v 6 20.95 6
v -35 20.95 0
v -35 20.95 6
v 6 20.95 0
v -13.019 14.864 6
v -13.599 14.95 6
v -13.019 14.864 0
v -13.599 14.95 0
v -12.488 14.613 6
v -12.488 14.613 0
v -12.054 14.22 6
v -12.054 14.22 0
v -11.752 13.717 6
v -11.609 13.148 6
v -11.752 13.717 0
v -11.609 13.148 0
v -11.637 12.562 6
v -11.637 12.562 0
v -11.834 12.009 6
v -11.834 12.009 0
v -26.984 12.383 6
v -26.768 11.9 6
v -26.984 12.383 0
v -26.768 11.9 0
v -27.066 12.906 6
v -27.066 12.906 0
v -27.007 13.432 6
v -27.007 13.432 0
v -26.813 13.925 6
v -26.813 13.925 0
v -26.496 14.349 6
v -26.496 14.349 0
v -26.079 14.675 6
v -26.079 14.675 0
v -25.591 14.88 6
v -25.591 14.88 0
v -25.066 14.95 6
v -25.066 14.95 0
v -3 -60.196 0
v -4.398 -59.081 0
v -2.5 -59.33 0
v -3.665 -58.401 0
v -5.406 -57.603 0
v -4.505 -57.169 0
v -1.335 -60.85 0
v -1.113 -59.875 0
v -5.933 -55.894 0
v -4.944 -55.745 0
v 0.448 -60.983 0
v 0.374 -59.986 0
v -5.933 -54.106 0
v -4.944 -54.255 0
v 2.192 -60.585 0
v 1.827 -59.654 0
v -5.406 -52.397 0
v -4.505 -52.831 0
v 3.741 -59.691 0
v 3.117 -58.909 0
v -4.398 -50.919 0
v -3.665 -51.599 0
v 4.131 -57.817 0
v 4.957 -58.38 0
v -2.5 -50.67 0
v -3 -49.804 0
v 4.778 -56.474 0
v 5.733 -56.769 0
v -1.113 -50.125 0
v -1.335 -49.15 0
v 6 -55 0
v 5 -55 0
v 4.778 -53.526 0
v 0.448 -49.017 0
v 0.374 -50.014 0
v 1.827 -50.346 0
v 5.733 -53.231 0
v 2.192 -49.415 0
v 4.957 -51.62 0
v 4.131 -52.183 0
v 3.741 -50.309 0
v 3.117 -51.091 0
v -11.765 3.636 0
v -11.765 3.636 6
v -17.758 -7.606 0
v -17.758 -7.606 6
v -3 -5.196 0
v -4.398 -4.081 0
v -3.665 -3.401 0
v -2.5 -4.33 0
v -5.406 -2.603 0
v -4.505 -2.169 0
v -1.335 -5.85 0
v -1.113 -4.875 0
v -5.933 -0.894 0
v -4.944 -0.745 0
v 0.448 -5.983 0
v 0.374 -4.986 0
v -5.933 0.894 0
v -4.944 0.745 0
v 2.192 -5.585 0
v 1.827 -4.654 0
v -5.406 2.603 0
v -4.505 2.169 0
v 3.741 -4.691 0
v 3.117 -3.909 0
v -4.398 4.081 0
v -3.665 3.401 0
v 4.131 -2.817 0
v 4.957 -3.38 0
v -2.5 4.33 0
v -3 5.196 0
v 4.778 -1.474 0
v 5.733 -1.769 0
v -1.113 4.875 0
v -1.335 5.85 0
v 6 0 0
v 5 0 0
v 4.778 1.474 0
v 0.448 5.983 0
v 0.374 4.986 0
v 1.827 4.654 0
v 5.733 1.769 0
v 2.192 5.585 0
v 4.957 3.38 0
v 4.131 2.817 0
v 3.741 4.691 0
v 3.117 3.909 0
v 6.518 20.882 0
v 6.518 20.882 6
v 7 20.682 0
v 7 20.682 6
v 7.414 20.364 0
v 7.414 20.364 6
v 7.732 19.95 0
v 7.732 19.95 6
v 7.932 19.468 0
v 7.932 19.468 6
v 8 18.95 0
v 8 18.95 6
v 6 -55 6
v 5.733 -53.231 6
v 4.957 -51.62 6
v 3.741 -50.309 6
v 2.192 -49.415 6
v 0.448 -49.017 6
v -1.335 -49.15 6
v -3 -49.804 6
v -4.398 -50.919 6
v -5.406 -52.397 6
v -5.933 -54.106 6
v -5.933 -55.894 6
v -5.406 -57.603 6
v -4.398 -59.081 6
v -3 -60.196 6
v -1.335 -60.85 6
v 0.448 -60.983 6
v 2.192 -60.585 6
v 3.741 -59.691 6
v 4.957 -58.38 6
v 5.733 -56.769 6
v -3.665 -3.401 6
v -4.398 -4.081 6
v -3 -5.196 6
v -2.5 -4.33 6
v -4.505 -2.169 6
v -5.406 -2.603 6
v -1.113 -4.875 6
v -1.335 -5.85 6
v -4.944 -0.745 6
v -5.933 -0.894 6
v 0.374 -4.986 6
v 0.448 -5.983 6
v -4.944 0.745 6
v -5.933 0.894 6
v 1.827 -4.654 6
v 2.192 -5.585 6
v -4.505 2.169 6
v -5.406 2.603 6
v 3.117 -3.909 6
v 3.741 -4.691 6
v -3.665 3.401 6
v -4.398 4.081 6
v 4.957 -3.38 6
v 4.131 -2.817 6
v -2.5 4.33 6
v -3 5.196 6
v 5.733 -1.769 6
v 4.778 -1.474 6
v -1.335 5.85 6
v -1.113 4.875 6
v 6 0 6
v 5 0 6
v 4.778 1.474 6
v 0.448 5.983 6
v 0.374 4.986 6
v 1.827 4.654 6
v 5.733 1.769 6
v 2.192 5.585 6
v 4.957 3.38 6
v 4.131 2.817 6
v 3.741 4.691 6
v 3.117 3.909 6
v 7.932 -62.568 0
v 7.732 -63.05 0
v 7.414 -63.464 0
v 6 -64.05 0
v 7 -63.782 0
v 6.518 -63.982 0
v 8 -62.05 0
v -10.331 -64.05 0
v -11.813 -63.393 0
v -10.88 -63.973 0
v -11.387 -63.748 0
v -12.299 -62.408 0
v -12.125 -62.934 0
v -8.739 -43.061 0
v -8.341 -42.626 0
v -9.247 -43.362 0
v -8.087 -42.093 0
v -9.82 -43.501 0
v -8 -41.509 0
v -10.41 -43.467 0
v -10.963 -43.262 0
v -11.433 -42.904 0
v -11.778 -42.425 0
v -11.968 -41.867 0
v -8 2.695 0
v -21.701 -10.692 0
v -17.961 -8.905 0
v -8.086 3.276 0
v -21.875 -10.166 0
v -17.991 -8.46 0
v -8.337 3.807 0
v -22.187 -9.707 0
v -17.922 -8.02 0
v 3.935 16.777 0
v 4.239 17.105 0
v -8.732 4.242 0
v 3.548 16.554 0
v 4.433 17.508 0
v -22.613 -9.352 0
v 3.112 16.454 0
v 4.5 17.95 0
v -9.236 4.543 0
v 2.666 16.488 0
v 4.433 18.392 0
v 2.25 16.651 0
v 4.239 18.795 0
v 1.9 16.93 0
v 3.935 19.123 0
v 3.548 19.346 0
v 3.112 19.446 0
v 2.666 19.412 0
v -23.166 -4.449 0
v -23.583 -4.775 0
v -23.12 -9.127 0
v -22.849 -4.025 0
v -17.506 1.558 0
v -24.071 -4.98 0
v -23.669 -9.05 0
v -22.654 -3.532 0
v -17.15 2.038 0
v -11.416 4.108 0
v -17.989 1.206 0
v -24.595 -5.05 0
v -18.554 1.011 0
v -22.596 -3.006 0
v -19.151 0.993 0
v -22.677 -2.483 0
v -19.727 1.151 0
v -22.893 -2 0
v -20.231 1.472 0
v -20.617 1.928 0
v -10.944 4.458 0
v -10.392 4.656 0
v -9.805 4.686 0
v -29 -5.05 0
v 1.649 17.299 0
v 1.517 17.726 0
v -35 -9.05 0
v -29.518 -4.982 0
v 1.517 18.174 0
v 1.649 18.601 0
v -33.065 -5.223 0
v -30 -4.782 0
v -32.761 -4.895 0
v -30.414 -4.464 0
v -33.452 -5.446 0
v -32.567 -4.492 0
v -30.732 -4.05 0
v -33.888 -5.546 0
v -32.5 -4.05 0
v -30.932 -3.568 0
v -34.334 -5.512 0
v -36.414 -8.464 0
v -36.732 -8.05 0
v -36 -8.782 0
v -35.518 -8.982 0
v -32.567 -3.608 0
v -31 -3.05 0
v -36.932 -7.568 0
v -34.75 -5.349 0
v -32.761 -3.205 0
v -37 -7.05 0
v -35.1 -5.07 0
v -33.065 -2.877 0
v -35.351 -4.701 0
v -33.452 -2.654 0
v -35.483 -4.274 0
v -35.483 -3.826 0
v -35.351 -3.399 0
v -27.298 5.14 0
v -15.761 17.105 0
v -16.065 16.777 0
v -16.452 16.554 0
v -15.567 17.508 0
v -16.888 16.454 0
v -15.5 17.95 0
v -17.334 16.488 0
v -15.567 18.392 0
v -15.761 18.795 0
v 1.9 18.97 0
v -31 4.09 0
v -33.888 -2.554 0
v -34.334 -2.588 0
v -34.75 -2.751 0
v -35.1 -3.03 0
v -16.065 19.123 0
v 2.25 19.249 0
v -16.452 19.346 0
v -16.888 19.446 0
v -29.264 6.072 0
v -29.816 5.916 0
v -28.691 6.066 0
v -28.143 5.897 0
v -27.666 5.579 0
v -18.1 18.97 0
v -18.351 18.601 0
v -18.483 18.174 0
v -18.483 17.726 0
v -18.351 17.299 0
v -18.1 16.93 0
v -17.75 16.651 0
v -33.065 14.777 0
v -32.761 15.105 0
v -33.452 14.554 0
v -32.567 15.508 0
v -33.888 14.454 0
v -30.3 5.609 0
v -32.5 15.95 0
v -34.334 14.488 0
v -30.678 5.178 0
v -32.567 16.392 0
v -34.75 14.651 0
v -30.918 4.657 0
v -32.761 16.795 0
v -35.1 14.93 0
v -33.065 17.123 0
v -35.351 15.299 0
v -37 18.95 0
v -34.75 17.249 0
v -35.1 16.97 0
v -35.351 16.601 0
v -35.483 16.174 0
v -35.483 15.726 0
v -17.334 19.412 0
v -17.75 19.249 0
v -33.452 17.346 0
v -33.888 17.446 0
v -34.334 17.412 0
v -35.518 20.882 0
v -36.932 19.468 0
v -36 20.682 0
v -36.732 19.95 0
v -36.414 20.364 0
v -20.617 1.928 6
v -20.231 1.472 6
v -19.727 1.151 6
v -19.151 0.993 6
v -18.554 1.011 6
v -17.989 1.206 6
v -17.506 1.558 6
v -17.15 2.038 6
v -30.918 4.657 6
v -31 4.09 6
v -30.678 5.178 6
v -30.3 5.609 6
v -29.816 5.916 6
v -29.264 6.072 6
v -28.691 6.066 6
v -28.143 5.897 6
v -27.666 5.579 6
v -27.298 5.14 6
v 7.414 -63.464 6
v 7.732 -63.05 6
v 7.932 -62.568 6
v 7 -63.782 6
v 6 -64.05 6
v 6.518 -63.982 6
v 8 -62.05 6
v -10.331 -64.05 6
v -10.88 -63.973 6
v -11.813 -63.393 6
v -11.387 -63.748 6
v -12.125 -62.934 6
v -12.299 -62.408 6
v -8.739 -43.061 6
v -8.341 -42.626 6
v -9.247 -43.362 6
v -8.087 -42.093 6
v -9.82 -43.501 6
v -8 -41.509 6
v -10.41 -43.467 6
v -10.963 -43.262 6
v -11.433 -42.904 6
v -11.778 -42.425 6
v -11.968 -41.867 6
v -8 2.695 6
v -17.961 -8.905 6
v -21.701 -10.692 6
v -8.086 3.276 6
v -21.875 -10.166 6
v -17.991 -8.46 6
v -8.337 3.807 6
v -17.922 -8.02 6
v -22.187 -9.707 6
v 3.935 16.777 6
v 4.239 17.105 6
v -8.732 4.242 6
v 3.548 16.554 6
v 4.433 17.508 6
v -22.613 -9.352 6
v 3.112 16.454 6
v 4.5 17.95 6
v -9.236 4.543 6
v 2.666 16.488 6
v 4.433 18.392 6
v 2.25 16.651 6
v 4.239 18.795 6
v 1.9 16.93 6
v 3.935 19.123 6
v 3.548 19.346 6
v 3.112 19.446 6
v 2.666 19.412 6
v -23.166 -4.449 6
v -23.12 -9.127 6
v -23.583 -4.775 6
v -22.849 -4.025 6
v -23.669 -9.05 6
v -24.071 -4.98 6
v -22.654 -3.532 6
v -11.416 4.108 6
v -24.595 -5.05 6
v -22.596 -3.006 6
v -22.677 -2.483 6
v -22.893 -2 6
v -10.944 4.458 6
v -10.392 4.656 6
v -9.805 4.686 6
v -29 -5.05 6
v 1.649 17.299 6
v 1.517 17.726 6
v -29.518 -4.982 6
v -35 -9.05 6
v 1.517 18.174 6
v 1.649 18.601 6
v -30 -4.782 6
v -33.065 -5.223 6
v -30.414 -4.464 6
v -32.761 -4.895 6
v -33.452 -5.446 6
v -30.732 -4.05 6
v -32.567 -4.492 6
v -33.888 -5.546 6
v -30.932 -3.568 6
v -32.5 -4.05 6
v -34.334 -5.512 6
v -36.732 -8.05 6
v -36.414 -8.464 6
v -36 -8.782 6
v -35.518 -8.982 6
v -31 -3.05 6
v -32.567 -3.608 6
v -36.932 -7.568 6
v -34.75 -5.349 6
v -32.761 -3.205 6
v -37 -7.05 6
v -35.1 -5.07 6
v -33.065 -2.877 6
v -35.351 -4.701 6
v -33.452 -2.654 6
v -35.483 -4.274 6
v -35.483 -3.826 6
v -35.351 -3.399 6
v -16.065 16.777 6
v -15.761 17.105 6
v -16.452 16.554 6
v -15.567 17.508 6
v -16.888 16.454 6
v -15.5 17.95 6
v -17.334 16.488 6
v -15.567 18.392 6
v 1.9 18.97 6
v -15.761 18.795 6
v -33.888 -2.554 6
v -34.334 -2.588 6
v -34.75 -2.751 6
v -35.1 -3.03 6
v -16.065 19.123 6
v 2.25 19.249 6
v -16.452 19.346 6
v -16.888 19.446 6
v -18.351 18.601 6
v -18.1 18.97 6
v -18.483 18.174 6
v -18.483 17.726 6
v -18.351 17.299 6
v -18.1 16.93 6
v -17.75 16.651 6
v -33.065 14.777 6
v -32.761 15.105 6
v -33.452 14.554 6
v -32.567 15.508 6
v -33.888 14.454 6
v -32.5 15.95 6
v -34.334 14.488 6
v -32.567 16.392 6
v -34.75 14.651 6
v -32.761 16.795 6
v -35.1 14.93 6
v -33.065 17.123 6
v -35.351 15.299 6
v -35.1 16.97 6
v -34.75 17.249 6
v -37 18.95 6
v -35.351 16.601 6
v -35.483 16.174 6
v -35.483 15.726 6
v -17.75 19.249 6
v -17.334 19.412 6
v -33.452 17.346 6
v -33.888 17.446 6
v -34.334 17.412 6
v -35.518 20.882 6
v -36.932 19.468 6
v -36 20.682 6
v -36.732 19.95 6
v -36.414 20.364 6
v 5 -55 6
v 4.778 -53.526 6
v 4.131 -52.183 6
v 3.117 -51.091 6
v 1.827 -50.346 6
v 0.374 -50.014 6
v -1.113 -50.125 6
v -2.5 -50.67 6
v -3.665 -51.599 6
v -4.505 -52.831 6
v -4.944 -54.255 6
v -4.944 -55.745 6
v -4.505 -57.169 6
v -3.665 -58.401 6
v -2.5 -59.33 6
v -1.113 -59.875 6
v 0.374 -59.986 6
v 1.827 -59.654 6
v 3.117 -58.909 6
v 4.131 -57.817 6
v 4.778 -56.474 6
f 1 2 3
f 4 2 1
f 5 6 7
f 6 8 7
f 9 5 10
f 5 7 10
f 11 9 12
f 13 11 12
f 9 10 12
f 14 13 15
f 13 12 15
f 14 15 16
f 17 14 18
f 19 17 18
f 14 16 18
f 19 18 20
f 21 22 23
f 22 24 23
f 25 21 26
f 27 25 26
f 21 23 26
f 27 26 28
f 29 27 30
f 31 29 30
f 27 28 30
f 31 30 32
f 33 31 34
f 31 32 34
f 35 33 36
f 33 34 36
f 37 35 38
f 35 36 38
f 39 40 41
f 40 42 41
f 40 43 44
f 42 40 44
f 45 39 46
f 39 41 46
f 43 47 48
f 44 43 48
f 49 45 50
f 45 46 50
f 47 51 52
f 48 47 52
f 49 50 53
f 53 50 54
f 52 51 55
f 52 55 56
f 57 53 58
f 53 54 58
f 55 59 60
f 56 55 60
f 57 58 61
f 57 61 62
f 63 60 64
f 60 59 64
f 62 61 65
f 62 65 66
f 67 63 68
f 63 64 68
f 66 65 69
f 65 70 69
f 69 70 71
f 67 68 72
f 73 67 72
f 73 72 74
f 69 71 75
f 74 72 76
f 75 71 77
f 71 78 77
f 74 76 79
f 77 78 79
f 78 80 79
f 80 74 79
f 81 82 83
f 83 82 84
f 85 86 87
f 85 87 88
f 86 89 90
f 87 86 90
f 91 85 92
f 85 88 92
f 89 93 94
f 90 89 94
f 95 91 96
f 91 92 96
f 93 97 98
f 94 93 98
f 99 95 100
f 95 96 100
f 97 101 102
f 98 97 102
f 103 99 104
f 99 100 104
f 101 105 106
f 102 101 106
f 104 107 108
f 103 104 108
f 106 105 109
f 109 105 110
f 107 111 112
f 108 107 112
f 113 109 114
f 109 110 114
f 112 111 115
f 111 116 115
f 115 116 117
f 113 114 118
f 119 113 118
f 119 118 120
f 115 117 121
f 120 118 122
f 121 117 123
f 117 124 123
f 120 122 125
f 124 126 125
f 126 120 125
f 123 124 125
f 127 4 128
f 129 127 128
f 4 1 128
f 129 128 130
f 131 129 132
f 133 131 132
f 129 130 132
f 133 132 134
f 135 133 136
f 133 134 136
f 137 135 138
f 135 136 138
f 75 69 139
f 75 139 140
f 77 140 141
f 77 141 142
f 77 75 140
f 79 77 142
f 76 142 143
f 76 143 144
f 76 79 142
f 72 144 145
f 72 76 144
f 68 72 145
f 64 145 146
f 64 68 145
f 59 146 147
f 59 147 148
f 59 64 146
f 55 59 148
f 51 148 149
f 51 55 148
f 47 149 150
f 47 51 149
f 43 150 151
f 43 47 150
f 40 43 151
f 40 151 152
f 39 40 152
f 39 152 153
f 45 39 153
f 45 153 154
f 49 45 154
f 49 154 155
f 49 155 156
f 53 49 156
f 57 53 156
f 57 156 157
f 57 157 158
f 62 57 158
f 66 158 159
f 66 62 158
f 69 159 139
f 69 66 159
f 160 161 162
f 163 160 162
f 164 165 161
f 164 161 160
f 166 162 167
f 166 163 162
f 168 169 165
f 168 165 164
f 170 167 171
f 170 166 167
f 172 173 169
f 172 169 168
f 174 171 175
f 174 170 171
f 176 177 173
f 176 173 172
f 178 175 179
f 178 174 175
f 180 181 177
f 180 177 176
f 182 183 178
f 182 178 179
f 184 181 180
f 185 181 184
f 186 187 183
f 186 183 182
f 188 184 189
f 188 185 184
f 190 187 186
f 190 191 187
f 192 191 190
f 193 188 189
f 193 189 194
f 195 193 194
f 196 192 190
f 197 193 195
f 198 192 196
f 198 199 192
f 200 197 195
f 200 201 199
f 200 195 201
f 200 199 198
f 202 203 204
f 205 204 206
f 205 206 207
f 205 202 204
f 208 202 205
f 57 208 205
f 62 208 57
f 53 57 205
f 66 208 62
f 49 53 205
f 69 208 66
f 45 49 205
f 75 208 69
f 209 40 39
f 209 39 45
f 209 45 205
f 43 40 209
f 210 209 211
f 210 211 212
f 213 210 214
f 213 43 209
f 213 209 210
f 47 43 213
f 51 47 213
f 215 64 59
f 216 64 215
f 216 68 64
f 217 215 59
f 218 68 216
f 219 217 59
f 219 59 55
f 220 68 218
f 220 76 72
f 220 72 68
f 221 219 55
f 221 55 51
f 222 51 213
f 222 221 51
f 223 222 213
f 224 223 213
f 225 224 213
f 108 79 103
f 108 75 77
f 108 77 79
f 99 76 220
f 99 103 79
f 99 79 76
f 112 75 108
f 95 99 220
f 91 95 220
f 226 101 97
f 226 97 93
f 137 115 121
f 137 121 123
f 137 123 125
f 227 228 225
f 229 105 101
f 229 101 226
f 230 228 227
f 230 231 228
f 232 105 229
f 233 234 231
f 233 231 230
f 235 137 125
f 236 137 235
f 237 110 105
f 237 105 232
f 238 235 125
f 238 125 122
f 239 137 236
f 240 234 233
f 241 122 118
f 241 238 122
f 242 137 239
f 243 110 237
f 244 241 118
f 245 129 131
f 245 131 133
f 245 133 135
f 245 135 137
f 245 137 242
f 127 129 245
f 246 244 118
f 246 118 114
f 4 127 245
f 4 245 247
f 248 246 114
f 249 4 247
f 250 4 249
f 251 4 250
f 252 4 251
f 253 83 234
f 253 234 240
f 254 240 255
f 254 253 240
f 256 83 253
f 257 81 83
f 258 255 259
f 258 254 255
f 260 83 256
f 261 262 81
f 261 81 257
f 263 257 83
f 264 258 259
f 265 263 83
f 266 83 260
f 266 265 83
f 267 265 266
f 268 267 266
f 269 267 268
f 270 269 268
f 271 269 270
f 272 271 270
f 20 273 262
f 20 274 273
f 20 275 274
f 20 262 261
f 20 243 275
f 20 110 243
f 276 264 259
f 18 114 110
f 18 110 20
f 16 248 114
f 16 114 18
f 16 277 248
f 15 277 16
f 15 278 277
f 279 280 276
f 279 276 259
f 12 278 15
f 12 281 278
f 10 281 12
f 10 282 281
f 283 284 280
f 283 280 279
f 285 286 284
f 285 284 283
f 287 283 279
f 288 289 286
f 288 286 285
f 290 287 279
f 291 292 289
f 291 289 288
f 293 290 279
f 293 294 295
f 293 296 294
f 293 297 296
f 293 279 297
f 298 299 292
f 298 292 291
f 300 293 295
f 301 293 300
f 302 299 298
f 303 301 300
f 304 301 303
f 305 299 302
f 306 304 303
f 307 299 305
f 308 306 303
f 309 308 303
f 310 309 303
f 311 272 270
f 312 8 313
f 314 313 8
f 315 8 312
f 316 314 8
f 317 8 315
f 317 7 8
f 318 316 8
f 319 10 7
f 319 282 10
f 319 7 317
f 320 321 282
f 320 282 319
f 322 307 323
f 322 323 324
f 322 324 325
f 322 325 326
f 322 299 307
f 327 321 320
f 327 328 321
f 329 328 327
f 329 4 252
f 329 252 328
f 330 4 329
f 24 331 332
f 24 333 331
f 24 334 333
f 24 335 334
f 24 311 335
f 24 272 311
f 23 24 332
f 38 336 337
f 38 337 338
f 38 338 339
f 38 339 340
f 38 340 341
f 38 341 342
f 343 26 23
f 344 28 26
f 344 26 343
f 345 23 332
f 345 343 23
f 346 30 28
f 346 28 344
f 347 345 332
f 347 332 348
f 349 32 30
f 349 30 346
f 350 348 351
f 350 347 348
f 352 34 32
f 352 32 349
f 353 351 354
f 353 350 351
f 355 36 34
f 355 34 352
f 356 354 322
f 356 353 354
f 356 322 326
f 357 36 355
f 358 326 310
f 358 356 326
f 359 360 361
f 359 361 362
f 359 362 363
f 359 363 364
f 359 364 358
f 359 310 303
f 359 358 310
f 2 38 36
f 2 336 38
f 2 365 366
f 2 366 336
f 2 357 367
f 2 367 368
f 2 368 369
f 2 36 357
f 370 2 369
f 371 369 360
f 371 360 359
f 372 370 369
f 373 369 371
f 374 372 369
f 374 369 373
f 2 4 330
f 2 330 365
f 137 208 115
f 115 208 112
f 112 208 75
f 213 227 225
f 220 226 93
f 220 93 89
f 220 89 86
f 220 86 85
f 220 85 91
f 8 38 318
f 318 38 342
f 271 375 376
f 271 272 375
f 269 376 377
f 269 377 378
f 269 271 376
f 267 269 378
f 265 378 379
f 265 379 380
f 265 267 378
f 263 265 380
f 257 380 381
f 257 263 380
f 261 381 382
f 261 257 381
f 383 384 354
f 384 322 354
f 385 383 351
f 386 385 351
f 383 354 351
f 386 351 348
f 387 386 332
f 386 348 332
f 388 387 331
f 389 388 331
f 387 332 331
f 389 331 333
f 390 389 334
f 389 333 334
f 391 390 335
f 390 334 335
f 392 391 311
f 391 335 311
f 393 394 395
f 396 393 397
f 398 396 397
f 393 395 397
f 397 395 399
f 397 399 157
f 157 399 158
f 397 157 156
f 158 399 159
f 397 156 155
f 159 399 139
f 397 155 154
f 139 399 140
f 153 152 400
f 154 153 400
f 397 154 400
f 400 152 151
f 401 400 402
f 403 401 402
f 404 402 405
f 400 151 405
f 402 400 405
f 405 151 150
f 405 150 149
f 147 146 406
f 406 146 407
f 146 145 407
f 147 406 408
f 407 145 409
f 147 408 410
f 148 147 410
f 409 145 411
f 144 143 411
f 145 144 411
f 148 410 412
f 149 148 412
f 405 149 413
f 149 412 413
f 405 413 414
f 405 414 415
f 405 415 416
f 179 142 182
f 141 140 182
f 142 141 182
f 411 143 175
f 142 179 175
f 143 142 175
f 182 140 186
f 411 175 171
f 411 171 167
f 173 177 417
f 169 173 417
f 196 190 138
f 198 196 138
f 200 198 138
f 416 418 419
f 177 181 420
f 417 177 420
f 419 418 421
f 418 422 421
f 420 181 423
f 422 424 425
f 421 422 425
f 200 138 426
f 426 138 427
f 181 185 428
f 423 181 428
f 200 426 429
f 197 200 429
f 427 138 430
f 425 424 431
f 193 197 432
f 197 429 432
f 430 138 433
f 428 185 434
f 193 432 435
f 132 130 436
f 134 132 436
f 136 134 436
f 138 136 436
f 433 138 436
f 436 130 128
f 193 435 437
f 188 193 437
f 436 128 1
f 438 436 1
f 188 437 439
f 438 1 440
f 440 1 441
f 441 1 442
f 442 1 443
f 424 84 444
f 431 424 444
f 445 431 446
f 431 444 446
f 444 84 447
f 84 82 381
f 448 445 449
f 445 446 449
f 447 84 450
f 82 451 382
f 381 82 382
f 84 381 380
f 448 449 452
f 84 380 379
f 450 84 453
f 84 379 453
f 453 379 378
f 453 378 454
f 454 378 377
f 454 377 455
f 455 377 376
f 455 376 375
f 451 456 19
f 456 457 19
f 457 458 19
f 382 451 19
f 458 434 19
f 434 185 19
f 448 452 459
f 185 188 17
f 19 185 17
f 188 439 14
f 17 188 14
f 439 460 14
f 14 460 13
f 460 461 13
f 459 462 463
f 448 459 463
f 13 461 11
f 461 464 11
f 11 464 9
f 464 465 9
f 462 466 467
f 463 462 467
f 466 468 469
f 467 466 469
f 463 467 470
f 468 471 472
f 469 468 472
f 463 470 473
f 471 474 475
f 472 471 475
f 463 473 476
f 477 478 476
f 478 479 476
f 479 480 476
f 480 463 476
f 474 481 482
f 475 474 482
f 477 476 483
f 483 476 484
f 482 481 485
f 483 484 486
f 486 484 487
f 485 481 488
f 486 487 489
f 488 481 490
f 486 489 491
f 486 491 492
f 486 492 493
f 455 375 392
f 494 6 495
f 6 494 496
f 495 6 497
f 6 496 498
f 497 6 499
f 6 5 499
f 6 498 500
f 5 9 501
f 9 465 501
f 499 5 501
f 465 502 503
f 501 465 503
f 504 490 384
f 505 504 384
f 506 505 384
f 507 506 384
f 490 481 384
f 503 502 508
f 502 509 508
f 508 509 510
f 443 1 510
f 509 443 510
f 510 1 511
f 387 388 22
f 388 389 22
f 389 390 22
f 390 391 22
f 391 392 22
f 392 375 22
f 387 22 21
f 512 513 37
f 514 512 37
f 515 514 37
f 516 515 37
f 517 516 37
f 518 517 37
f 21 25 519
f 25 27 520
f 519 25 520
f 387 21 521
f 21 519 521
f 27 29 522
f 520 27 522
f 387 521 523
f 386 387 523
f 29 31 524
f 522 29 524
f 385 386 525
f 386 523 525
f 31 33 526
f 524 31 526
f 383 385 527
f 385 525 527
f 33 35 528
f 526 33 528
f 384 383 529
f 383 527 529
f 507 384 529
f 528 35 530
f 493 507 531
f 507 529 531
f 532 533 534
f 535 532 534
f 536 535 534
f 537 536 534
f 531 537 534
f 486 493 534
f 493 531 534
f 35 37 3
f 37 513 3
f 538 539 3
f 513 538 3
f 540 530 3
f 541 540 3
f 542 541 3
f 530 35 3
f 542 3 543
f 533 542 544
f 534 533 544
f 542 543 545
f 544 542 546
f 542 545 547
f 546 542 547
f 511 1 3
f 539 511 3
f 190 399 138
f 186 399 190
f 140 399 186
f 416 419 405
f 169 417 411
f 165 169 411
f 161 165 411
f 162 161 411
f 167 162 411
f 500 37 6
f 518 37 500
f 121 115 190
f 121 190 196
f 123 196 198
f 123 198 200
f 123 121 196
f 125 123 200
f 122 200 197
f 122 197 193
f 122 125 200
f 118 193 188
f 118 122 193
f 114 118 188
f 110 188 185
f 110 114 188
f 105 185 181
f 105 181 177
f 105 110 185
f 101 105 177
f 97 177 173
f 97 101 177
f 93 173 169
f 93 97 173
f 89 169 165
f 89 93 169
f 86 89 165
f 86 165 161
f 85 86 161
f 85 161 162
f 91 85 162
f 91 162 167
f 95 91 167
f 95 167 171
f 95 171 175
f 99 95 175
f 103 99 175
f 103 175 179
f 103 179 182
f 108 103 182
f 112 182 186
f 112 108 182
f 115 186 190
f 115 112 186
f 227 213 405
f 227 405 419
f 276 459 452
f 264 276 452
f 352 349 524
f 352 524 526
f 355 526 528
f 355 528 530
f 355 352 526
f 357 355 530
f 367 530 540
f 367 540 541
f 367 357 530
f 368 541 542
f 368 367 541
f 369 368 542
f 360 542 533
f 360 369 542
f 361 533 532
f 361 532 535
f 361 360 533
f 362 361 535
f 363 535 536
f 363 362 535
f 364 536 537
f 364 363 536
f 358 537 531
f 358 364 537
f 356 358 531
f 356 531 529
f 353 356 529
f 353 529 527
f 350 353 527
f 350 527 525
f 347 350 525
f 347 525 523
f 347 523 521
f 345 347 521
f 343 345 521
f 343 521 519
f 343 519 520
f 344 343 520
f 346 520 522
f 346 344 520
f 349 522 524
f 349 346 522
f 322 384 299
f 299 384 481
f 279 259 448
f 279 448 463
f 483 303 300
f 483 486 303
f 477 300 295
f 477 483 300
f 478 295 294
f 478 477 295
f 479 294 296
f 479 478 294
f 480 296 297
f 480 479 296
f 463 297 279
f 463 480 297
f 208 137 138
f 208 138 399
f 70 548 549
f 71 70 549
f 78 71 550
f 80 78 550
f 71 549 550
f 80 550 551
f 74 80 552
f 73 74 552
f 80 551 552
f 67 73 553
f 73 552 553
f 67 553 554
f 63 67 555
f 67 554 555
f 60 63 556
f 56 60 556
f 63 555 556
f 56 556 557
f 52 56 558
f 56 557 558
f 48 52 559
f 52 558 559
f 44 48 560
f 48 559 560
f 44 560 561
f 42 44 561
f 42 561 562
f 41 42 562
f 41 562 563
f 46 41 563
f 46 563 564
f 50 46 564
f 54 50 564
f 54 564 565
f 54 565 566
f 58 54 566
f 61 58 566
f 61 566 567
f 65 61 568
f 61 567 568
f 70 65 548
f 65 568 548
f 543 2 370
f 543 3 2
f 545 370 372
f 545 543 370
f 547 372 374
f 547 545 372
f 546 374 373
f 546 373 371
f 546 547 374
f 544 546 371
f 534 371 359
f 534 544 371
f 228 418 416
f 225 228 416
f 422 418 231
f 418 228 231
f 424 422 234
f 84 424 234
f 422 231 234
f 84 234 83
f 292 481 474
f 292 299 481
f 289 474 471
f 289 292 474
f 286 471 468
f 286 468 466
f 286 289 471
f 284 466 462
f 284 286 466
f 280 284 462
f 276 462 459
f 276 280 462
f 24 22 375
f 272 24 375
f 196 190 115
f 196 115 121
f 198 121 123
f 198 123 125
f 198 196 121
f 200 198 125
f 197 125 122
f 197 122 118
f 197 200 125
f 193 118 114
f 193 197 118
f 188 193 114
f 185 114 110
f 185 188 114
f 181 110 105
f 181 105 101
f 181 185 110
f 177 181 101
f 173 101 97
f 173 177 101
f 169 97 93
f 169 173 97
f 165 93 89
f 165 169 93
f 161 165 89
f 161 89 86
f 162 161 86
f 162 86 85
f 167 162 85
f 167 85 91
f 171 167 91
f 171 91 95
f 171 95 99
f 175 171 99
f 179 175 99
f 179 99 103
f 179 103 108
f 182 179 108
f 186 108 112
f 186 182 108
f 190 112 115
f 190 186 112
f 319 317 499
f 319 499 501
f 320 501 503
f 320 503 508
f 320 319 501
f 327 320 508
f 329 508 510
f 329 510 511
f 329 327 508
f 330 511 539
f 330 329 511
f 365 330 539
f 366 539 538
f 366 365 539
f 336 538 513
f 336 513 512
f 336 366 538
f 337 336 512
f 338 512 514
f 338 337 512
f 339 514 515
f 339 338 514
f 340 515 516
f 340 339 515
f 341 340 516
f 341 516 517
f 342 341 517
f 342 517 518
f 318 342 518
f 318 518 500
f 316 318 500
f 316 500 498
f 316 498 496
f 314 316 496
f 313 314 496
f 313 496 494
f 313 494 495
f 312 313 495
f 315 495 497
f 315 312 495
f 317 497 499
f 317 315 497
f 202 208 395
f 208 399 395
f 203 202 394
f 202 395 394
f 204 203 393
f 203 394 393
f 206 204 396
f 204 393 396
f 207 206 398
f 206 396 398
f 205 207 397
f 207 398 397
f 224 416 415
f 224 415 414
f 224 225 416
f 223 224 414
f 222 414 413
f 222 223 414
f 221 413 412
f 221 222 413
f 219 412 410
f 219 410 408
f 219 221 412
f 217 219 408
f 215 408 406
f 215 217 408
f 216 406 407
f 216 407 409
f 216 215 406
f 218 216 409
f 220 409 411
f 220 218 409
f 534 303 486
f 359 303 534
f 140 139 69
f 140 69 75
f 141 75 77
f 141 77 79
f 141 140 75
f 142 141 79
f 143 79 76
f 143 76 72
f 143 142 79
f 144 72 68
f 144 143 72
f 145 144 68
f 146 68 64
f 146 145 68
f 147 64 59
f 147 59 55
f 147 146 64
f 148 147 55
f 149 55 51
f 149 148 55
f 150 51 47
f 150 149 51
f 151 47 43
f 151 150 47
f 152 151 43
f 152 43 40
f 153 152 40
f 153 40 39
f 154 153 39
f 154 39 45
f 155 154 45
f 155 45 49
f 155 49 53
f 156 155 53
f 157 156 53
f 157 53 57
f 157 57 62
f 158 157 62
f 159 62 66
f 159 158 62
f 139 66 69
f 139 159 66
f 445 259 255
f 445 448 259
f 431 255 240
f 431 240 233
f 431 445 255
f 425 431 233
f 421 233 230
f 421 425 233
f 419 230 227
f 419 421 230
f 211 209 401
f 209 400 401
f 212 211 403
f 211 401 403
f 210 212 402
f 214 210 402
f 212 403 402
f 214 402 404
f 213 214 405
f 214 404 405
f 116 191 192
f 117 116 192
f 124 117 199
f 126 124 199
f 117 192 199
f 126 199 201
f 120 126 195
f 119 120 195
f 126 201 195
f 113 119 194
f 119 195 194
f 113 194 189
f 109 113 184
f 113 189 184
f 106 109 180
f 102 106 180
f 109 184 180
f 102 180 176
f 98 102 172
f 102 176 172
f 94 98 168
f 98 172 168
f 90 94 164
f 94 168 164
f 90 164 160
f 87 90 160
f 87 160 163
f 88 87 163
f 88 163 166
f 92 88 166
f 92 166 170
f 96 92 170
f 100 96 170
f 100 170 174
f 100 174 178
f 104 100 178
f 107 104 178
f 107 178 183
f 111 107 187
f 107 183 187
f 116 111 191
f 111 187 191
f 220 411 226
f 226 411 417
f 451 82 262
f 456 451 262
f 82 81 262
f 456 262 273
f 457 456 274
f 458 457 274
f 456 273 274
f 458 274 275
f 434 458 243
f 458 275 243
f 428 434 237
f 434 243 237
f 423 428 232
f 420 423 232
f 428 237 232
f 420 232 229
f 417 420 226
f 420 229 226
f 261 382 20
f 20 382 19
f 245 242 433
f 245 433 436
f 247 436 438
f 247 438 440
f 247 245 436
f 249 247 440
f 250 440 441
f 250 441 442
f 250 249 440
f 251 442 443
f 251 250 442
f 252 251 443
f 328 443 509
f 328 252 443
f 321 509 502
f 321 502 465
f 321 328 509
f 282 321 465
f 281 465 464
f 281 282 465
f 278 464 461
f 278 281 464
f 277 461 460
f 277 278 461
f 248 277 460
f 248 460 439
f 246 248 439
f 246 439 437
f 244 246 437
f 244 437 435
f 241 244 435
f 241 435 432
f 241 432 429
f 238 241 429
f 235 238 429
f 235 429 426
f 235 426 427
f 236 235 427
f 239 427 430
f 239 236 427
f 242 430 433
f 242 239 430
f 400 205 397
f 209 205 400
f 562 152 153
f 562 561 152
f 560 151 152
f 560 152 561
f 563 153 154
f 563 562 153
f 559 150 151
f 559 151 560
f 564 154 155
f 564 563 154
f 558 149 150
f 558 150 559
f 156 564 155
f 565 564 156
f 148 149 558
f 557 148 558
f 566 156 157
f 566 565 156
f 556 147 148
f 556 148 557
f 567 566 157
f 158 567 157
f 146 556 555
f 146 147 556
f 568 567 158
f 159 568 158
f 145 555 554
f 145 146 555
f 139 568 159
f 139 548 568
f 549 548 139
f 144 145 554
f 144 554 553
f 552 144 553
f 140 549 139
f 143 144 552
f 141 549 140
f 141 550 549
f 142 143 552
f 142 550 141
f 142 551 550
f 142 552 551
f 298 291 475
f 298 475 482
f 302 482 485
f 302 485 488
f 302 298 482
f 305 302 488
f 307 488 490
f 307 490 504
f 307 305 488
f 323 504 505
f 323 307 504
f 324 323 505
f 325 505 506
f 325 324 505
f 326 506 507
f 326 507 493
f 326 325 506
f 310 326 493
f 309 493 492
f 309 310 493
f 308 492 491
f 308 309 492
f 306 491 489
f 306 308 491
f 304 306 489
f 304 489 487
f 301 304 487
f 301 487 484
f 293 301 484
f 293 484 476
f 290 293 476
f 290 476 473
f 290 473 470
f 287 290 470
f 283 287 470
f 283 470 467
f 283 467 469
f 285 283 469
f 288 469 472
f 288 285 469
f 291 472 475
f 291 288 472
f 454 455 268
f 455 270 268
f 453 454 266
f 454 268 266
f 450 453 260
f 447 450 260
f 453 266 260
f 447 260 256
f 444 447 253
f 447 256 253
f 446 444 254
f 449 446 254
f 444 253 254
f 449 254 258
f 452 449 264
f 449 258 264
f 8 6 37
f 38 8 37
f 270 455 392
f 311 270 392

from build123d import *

# Parameters (mm, degrees)
SKETCH_1_R          = 6
SKETCH_1_R_2        = 1.5
EXTRUDE_1_DEPTH     = 6
SKETCH_2_R          = 6
SKETCH_2_R_2        = 5
EXTRUDE_2_DEPTH     = 6
EXTRUDE_2_2_DEPTH   = 6
CUT_EXTRUDE_1_DEPTH = 6
FILLET_2_R          = 2
SKETCH_4_R          = 8
SKETCH_4_R_2        = 5
EXTRUDE_3_DEPTH     = 0.5
EXTRUDE_3_2_DEPTH   = 0.5
SKETCH_5_R          = 8
SKETCH_5_R_2        = 5
EXTRUDE_4_DEPTH     = 0.5
EXTRUDE_4_2_DEPTH   = 0.5


with BuildPart() as part:
    # 草图1 → 凸台-拉伸1 (new body)
    with BuildSketch(Plane.XY):
        Polygon((-37, 20.95), (8, 20.95), (8, -64.05), (-12, -64.05), (-22, -9.05), (-37, -9.05), align=None)
        Circle(SKETCH_1_R, mode=Mode.SUBTRACT)
        with Locations((0, -55)):
            Circle(SKETCH_1_R, mode=Mode.SUBTRACT)
        with Locations((3, 17.95)):
            Circle(SKETCH_1_R_2, mode=Mode.SUBTRACT)
        with Locations((-17, 17.95)):
            Circle(SKETCH_1_R_2, mode=Mode.SUBTRACT)
        with Locations((-34, 15.95)):
            Circle(SKETCH_1_R_2, mode=Mode.SUBTRACT)
        with Locations((-34, -4.05)):
            Circle(SKETCH_1_R_2, mode=Mode.SUBTRACT)
    extrude(amount=EXTRUDE_1_DEPTH)

    # 草图3 → 切除-拉伸1 (cut)
    with BuildSketch(Plane.XY.offset(6)):
        Polygon((-8, -63.689320225), (-8, 10.698456851), (-18.085282501, -8.220266471), align=None)
        Polygon((-18.788186972, -1.035740679), (-10.266432729, 14.95), (-28.65003451, 14.95), align=None)
        Polygon((-31, -5.05), (-21.011660076, -5.05), (-31, 11.140780806), align=None)
    extrude(amount=-CUT_EXTRUDE_1_DEPTH, mode=Mode.SUBTRACT)

    # 圆角2
    fillet_2_edges = [part.edges().sort_by_distance(p)[0] for p in [
        (8, -64.05, 3),
        (-12, -64.05, 3),
        (-22, -9.05, 3),
        (-37, -9.05, 3),
        (-37, 20.95, 3),
        (8, 20.95, 3),
        (-10.266432729, 14.95, 3),
        (-28.65003451, 14.95, 3),
        (-18.788186972, -1.035740679, 3),
        (-31, 11.140780806, 3),
        (-21.011660076, -5.05, 3),
        (-31, -5.05, 3),
        (-18.085282501, -8.220266471, 3),
        (-8, -63.689320225, 3),
        (-8, 10.698456851, 3),
    ]]
    fillet(fillet_2_edges, radius=FILLET_2_R)


with BuildPart() as body_2:
    # 草图2 → 凸台-拉伸2 (new body)
    with BuildSketch(Plane.XY.offset(6)):
        with Locations((0, -55)):
            Circle(SKETCH_2_R)
        with Locations((0, -55)):
            Circle(SKETCH_2_R_2, mode=Mode.SUBTRACT)
    extrude(amount=-EXTRUDE_2_DEPTH)


with BuildPart() as body_3:
    # 草图2 → Extrude 2 2 (new body)
    with BuildSketch(Plane.XY.offset(6)):
        Circle(SKETCH_2_R)
        Circle(SKETCH_2_R_2, mode=Mode.SUBTRACT)
    extrude(amount=-EXTRUDE_2_2_DEPTH)


with BuildPart() as body_4:
    # 草图4 → 凸台-拉伸3 (new body)
    with BuildSketch(Plane.XY.offset(6)):
        Circle(SKETCH_4_R)
        Circle(SKETCH_4_R_2, mode=Mode.SUBTRACT)
    extrude(amount=EXTRUDE_3_DEPTH)


with BuildPart() as body_5:
    # 草图4 → Extrude 3 2 (new body)
    with BuildSketch(Plane.XY.offset(6)):
        with Locations((0, -55)):
            Circle(SKETCH_4_R)
        with Locations((0, -55)):
            Circle(SKETCH_4_R_2, mode=Mode.SUBTRACT)
    extrude(amount=EXTRUDE_3_2_DEPTH)


with BuildPart() as body_6:
    # 草图5 → 凸台-拉伸4 (new body)
    with BuildSketch(Plane(origin=(0, 0, 0), x_dir=(-1, 0, 0), z_dir=(0, 0, -1))):
        with Locations((0, -55)):
            Circle(SKETCH_5_R)
        with Locations(Location((0, -55, 0), (0, 0, 180))):
            Circle(SKETCH_5_R_2, mode=Mode.SUBTRACT)
    extrude(amount=EXTRUDE_4_DEPTH)


with BuildPart() as body_7:
    # 草图5 → Extrude 4 2 (new body)
    with BuildSketch(Plane(origin=(0, 0, 0), x_dir=(-1, 0, 0), z_dir=(0, 0, -1))):
        Circle(SKETCH_5_R)
        with Locations(Location((0, 0, 0), (0, 0, 180))):
            Circle(SKETCH_5_R_2, mode=Mode.SUBTRACT)
    extrude(amount=EXTRUDE_4_2_DEPTH)


solid = Compound([part.part, body_2.part, body_3.part])
